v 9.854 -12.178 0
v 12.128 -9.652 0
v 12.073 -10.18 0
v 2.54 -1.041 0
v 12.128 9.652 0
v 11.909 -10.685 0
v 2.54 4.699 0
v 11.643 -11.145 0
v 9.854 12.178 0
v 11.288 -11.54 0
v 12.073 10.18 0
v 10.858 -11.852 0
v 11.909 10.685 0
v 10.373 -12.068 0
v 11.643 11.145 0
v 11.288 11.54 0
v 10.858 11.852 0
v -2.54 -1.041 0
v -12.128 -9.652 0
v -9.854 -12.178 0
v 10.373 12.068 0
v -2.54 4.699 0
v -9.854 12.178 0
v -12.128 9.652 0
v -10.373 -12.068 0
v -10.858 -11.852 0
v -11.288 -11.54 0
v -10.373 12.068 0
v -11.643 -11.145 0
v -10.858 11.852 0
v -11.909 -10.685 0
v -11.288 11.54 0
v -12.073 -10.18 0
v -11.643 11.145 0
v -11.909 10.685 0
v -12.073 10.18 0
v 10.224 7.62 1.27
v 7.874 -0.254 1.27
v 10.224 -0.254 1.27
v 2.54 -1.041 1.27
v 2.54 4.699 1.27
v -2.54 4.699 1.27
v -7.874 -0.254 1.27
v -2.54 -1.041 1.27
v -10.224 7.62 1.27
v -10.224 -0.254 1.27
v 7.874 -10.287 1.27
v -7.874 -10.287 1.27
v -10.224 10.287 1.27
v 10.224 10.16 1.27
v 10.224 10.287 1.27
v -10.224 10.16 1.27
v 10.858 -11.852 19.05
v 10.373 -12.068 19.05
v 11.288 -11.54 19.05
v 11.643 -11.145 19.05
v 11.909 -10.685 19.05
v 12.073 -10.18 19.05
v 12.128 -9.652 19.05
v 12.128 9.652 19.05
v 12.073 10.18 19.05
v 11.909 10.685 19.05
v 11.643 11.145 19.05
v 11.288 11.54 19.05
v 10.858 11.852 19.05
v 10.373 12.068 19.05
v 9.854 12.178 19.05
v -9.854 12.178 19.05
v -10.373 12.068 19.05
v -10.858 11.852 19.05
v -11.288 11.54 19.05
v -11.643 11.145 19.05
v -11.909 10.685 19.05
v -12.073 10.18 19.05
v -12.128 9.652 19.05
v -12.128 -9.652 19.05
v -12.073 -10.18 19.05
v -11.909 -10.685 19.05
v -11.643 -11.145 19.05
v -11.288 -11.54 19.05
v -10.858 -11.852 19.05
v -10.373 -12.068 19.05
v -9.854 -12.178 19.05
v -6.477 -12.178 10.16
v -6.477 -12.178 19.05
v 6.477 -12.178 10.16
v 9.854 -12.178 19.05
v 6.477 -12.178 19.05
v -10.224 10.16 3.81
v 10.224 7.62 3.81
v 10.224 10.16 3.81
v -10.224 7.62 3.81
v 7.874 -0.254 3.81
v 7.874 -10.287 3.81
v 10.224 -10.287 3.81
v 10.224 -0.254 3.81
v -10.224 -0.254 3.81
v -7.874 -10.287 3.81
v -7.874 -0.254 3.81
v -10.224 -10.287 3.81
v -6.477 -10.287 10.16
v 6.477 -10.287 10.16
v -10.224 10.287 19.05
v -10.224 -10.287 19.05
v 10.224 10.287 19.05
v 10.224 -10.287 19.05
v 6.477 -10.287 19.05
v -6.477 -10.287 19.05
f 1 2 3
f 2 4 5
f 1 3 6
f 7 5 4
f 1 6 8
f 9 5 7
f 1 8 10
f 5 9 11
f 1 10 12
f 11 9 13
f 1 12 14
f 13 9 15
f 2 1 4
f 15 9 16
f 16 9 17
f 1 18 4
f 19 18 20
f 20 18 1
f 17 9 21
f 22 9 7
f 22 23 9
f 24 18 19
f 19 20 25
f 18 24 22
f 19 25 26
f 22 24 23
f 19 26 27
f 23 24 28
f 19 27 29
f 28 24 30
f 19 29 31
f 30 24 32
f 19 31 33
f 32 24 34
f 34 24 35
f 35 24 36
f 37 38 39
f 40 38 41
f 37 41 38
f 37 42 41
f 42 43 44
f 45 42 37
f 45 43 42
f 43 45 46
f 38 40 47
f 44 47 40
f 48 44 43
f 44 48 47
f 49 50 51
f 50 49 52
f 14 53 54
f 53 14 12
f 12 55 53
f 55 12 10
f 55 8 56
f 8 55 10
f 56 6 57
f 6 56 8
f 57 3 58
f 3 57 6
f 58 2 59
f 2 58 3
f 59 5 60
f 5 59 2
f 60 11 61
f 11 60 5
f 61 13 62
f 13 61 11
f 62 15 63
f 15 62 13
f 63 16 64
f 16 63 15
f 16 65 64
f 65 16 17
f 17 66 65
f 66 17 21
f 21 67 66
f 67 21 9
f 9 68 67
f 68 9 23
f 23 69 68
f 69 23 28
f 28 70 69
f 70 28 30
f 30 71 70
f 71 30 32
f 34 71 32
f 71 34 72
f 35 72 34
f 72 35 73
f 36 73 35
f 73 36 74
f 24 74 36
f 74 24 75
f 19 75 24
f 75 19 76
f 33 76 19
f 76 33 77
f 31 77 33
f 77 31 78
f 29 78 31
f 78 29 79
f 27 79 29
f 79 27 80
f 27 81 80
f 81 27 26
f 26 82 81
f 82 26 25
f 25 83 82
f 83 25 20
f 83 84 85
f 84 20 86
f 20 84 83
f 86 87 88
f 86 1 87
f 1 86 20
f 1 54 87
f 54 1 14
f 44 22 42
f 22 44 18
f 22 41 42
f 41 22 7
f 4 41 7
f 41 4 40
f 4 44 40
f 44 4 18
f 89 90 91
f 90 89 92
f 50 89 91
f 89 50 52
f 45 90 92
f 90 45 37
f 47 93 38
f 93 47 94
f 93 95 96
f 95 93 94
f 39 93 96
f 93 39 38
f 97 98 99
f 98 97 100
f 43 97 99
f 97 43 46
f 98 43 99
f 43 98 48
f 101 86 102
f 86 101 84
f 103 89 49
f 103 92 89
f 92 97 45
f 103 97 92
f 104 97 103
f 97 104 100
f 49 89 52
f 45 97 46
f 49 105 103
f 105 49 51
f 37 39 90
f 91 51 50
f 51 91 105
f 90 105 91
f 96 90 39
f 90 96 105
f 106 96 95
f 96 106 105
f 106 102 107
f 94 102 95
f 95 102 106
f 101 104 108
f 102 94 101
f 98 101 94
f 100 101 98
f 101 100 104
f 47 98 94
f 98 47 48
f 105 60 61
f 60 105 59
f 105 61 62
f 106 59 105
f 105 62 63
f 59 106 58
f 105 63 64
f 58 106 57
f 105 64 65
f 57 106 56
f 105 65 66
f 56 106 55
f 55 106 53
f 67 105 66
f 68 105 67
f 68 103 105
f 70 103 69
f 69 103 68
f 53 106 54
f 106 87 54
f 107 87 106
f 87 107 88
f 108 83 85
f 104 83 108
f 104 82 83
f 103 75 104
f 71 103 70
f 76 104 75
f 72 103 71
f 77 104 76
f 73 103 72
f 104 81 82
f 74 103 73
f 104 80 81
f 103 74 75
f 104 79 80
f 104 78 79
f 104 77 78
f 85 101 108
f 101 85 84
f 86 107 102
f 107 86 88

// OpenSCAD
ViewScale = [0.0254, 0.0254, 0.0254];


module rectHull(r, x, y)
{
    hull()
    {
        // place 4 circles in the corners, with the given r
        //translate([(-x/2)+(r/2), (-y/2)+(r/2), 0])
        translate([(-x/2)+r, (-y/2)+r, 0])
            circle(r=r);

        //translate([(x/2)-(r/2), (-y/2)+(r/2), 0])
        translate([(x/2)-r, (-y/2)+r, 0])
            circle(r=r);

        //translate([(-x/2)+(r/2), (y/2)-(r/2), 0])
        translate([(-x/2)+r, (y/2)-r, 0])
            circle(r=r);

        //translate([(x/2)-(r/2), (y/2)-(r/2), 0])
        translate([(x/2)-r, (y/2)-r, 0])
            circle(r=r);
    }
}

scale(ViewScale)
{
    linear_extrude(50)
    difference() {
        rectHull(100, 955, 960);
        translate([0, 72, 0])
        square([200, 226], center=true);
        //square([100, 163], center=true);
    }
    translate([-410, 300, 50])
    linear_extrude(100)
    square([820, 100]);

    translate([310, -410, 50])
    linear_extrude(100)
    square([100, 400]);

    translate([-410, -410, 50])
    linear_extrude(100)
    square([100, 400]);

    translate([0, 0, 50])
    linear_extrude(350)
    difference() {
        rectHull(100, 955, 960);
        square([805, 810], center=true);
    }

    translate([0, 0, 400])
    linear_extrude(350)
    difference() {
        rectHull(100, 955, 960);
        square([805, 810], center=true);
        translate([0, -450])
        square([510, 200], center=true);
    }
}
